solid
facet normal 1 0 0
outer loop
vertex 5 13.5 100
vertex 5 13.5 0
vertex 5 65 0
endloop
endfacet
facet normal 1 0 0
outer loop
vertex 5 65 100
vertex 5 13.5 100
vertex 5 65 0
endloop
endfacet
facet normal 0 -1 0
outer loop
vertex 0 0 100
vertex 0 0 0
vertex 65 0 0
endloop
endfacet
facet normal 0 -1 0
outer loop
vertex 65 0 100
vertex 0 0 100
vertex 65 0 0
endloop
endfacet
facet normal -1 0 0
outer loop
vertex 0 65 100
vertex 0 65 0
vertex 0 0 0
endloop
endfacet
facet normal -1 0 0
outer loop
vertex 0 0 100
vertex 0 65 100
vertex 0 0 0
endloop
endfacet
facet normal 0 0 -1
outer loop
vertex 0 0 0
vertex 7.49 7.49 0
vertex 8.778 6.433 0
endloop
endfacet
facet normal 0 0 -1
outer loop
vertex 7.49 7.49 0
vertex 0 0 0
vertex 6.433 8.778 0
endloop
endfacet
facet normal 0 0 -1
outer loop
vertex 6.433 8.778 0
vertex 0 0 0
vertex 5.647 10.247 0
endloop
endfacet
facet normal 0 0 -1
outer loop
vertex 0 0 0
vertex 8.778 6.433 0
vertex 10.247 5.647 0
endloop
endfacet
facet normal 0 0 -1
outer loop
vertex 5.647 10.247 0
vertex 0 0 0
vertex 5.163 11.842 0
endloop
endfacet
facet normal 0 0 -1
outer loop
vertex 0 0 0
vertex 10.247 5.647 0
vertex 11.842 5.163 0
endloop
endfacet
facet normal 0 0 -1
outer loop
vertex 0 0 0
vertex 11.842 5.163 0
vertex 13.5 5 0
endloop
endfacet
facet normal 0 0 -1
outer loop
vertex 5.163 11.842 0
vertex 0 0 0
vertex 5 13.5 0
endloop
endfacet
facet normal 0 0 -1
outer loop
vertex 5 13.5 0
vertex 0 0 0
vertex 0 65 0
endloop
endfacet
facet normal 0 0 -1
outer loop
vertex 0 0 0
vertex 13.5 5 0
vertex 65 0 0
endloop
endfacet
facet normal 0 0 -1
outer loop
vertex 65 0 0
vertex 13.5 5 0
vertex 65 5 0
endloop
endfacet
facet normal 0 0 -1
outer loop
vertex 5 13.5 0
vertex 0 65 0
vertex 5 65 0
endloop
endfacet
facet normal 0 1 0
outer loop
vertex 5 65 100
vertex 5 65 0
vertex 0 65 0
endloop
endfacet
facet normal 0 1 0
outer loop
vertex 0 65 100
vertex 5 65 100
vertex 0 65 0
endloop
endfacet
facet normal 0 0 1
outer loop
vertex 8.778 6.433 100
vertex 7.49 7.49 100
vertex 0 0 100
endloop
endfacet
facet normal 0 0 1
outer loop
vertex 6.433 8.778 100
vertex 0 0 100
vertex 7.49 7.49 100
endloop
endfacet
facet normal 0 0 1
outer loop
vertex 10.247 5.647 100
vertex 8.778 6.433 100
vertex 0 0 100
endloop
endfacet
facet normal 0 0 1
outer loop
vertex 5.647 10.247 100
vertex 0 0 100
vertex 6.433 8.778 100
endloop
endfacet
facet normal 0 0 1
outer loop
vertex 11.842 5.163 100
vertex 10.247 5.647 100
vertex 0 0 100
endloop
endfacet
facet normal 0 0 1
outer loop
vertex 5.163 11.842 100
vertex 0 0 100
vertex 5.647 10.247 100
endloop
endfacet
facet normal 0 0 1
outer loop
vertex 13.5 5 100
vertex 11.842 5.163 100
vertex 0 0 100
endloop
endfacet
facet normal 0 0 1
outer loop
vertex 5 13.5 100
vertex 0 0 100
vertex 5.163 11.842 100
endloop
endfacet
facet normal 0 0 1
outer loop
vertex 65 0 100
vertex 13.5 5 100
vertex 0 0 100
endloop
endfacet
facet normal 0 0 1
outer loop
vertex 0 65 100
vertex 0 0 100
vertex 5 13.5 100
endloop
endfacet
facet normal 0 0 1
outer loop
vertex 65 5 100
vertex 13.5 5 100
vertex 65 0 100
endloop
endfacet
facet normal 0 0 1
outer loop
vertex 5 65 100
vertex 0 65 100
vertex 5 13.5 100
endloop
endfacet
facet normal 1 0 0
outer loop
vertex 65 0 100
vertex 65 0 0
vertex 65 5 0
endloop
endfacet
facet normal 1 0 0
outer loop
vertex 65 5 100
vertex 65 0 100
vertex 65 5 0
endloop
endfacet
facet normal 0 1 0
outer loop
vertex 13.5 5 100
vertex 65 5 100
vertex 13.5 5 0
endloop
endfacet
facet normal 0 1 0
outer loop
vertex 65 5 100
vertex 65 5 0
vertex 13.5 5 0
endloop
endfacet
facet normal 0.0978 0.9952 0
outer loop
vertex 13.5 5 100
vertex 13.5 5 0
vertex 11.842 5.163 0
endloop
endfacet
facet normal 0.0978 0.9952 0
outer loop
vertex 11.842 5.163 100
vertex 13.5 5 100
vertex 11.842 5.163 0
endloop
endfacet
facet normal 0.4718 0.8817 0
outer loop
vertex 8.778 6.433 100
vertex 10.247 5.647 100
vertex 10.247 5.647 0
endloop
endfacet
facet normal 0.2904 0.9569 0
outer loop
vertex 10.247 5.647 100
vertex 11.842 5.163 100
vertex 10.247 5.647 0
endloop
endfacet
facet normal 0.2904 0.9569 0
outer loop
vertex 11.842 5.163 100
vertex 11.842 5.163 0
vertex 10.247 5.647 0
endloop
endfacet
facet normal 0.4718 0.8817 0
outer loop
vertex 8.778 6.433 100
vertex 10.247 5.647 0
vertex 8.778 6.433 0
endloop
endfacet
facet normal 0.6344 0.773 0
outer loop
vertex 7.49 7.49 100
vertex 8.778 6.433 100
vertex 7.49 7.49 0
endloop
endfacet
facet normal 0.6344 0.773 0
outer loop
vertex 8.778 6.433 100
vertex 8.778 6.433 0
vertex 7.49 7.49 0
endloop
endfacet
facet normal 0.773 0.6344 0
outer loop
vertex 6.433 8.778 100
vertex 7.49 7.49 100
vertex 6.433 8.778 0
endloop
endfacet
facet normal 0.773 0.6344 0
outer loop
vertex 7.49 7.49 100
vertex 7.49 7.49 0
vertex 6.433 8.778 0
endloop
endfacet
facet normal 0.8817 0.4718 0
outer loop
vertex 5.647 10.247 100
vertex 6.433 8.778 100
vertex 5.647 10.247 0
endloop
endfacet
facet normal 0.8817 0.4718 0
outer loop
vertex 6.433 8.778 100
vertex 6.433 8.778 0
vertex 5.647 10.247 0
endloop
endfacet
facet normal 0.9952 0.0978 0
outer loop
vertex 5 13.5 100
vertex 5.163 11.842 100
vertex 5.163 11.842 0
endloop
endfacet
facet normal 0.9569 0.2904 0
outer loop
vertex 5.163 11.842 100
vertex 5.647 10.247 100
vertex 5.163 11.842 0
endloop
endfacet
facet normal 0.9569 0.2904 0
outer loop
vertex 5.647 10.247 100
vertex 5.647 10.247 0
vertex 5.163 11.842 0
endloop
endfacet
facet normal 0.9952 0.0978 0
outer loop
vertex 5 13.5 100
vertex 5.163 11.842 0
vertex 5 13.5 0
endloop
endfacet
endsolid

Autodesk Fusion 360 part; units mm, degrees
sketch "スケッチ1" plane through (0, 0, 0) normal (0, 0, 1) x (1, 0, 0)
  line L0 (0, 65) -> (0, 0)
  line L1 (5, 13.5) -> (5, 65)
  line L2 (65, 5) -> (13.5, 5)
  line L3 (0, 0) -> (65, 0)
  arc A0 (5, 13.5) -> (13.5, 5) centre (13.5, 13.5) ccw
  line L4 (65, 0) -> (65, 5)
  line L5 (5, 65) -> (0, 65)
extrude "押し出し1" add sketch "スケッチ1" along normal blind 100
